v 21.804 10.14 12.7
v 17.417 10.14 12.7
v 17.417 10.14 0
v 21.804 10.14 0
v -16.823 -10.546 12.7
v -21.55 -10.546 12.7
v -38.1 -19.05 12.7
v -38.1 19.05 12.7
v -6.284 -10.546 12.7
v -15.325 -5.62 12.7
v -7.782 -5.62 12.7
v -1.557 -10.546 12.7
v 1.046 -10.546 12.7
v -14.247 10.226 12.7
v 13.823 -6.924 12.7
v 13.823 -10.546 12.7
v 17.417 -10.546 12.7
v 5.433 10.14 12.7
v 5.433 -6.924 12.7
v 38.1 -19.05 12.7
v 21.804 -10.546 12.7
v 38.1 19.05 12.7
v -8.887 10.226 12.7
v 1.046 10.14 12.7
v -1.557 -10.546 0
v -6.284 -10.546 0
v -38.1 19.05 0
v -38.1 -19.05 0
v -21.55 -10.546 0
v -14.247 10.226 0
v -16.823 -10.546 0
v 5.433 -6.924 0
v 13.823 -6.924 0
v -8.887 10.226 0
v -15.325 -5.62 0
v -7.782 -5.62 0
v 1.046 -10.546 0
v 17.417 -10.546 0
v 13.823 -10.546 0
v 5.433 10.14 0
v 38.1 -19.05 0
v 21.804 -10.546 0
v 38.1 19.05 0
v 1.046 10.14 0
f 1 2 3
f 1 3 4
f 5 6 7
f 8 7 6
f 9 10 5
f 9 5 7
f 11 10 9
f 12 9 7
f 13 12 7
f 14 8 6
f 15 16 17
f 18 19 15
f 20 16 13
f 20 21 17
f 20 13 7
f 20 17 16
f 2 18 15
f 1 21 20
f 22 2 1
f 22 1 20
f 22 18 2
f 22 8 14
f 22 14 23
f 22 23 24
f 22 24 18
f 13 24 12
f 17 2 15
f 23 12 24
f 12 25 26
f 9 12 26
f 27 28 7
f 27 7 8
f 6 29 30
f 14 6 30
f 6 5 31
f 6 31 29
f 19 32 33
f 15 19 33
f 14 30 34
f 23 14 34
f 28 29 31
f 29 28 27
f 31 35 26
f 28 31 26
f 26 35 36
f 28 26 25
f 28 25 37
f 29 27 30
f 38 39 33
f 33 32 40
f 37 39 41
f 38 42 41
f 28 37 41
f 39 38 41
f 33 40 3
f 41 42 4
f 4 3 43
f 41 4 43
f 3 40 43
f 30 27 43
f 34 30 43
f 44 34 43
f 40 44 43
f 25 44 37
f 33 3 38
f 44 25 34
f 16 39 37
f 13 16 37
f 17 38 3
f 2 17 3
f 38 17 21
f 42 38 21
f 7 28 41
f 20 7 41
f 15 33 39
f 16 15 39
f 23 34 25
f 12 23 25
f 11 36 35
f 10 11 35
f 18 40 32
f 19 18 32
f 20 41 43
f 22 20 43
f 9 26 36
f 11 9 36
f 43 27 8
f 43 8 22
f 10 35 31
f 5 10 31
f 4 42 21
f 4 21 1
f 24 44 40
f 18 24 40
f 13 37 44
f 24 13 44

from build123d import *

# Parameters (mm, degrees)
F0_W     = 76.2
F0_H     = 38.1
F0_W_2   = 4.3870395845
F0_H_2   = 20.68563866
F1_DEPTH = 12.7


with BuildPart() as f1:
    # F0 (on Top) → F1 (new body)
    with BuildSketch(Plane.XY):
        Rectangle(F0_W, F0_H)
        Polygon((-1.5570254376, -10.5457305908), (-6.2836191695, -10.5457305908), (-7.7821848067, -5.6199317591), (-15.3248142677, -5.6199317591), (-16.823379905, -10.5457305908), (-21.5499736369, -10.5457305908), (-14.2472957733, 10.2259284532), (-8.8868676329, 10.2259284532), align=None, mode=Mode.SUBTRACT)
        Polygon((13.8225137457, -10.5457305908), (1.0462230259, -10.5457305908), (1.0462230259, 10.1399080692), (5.4332626104, 10.1399080692), (5.4332626104, -6.9238196851), (13.8225137457, -6.9238196851), align=None, mode=Mode.SUBTRACT)
        with Locations((19.6107801118, -0.2029112608)):
            Rectangle(F0_W_2, F0_H_2, mode=Mode.SUBTRACT)
    extrude(amount=F1_DEPTH)


solid = f1.part
